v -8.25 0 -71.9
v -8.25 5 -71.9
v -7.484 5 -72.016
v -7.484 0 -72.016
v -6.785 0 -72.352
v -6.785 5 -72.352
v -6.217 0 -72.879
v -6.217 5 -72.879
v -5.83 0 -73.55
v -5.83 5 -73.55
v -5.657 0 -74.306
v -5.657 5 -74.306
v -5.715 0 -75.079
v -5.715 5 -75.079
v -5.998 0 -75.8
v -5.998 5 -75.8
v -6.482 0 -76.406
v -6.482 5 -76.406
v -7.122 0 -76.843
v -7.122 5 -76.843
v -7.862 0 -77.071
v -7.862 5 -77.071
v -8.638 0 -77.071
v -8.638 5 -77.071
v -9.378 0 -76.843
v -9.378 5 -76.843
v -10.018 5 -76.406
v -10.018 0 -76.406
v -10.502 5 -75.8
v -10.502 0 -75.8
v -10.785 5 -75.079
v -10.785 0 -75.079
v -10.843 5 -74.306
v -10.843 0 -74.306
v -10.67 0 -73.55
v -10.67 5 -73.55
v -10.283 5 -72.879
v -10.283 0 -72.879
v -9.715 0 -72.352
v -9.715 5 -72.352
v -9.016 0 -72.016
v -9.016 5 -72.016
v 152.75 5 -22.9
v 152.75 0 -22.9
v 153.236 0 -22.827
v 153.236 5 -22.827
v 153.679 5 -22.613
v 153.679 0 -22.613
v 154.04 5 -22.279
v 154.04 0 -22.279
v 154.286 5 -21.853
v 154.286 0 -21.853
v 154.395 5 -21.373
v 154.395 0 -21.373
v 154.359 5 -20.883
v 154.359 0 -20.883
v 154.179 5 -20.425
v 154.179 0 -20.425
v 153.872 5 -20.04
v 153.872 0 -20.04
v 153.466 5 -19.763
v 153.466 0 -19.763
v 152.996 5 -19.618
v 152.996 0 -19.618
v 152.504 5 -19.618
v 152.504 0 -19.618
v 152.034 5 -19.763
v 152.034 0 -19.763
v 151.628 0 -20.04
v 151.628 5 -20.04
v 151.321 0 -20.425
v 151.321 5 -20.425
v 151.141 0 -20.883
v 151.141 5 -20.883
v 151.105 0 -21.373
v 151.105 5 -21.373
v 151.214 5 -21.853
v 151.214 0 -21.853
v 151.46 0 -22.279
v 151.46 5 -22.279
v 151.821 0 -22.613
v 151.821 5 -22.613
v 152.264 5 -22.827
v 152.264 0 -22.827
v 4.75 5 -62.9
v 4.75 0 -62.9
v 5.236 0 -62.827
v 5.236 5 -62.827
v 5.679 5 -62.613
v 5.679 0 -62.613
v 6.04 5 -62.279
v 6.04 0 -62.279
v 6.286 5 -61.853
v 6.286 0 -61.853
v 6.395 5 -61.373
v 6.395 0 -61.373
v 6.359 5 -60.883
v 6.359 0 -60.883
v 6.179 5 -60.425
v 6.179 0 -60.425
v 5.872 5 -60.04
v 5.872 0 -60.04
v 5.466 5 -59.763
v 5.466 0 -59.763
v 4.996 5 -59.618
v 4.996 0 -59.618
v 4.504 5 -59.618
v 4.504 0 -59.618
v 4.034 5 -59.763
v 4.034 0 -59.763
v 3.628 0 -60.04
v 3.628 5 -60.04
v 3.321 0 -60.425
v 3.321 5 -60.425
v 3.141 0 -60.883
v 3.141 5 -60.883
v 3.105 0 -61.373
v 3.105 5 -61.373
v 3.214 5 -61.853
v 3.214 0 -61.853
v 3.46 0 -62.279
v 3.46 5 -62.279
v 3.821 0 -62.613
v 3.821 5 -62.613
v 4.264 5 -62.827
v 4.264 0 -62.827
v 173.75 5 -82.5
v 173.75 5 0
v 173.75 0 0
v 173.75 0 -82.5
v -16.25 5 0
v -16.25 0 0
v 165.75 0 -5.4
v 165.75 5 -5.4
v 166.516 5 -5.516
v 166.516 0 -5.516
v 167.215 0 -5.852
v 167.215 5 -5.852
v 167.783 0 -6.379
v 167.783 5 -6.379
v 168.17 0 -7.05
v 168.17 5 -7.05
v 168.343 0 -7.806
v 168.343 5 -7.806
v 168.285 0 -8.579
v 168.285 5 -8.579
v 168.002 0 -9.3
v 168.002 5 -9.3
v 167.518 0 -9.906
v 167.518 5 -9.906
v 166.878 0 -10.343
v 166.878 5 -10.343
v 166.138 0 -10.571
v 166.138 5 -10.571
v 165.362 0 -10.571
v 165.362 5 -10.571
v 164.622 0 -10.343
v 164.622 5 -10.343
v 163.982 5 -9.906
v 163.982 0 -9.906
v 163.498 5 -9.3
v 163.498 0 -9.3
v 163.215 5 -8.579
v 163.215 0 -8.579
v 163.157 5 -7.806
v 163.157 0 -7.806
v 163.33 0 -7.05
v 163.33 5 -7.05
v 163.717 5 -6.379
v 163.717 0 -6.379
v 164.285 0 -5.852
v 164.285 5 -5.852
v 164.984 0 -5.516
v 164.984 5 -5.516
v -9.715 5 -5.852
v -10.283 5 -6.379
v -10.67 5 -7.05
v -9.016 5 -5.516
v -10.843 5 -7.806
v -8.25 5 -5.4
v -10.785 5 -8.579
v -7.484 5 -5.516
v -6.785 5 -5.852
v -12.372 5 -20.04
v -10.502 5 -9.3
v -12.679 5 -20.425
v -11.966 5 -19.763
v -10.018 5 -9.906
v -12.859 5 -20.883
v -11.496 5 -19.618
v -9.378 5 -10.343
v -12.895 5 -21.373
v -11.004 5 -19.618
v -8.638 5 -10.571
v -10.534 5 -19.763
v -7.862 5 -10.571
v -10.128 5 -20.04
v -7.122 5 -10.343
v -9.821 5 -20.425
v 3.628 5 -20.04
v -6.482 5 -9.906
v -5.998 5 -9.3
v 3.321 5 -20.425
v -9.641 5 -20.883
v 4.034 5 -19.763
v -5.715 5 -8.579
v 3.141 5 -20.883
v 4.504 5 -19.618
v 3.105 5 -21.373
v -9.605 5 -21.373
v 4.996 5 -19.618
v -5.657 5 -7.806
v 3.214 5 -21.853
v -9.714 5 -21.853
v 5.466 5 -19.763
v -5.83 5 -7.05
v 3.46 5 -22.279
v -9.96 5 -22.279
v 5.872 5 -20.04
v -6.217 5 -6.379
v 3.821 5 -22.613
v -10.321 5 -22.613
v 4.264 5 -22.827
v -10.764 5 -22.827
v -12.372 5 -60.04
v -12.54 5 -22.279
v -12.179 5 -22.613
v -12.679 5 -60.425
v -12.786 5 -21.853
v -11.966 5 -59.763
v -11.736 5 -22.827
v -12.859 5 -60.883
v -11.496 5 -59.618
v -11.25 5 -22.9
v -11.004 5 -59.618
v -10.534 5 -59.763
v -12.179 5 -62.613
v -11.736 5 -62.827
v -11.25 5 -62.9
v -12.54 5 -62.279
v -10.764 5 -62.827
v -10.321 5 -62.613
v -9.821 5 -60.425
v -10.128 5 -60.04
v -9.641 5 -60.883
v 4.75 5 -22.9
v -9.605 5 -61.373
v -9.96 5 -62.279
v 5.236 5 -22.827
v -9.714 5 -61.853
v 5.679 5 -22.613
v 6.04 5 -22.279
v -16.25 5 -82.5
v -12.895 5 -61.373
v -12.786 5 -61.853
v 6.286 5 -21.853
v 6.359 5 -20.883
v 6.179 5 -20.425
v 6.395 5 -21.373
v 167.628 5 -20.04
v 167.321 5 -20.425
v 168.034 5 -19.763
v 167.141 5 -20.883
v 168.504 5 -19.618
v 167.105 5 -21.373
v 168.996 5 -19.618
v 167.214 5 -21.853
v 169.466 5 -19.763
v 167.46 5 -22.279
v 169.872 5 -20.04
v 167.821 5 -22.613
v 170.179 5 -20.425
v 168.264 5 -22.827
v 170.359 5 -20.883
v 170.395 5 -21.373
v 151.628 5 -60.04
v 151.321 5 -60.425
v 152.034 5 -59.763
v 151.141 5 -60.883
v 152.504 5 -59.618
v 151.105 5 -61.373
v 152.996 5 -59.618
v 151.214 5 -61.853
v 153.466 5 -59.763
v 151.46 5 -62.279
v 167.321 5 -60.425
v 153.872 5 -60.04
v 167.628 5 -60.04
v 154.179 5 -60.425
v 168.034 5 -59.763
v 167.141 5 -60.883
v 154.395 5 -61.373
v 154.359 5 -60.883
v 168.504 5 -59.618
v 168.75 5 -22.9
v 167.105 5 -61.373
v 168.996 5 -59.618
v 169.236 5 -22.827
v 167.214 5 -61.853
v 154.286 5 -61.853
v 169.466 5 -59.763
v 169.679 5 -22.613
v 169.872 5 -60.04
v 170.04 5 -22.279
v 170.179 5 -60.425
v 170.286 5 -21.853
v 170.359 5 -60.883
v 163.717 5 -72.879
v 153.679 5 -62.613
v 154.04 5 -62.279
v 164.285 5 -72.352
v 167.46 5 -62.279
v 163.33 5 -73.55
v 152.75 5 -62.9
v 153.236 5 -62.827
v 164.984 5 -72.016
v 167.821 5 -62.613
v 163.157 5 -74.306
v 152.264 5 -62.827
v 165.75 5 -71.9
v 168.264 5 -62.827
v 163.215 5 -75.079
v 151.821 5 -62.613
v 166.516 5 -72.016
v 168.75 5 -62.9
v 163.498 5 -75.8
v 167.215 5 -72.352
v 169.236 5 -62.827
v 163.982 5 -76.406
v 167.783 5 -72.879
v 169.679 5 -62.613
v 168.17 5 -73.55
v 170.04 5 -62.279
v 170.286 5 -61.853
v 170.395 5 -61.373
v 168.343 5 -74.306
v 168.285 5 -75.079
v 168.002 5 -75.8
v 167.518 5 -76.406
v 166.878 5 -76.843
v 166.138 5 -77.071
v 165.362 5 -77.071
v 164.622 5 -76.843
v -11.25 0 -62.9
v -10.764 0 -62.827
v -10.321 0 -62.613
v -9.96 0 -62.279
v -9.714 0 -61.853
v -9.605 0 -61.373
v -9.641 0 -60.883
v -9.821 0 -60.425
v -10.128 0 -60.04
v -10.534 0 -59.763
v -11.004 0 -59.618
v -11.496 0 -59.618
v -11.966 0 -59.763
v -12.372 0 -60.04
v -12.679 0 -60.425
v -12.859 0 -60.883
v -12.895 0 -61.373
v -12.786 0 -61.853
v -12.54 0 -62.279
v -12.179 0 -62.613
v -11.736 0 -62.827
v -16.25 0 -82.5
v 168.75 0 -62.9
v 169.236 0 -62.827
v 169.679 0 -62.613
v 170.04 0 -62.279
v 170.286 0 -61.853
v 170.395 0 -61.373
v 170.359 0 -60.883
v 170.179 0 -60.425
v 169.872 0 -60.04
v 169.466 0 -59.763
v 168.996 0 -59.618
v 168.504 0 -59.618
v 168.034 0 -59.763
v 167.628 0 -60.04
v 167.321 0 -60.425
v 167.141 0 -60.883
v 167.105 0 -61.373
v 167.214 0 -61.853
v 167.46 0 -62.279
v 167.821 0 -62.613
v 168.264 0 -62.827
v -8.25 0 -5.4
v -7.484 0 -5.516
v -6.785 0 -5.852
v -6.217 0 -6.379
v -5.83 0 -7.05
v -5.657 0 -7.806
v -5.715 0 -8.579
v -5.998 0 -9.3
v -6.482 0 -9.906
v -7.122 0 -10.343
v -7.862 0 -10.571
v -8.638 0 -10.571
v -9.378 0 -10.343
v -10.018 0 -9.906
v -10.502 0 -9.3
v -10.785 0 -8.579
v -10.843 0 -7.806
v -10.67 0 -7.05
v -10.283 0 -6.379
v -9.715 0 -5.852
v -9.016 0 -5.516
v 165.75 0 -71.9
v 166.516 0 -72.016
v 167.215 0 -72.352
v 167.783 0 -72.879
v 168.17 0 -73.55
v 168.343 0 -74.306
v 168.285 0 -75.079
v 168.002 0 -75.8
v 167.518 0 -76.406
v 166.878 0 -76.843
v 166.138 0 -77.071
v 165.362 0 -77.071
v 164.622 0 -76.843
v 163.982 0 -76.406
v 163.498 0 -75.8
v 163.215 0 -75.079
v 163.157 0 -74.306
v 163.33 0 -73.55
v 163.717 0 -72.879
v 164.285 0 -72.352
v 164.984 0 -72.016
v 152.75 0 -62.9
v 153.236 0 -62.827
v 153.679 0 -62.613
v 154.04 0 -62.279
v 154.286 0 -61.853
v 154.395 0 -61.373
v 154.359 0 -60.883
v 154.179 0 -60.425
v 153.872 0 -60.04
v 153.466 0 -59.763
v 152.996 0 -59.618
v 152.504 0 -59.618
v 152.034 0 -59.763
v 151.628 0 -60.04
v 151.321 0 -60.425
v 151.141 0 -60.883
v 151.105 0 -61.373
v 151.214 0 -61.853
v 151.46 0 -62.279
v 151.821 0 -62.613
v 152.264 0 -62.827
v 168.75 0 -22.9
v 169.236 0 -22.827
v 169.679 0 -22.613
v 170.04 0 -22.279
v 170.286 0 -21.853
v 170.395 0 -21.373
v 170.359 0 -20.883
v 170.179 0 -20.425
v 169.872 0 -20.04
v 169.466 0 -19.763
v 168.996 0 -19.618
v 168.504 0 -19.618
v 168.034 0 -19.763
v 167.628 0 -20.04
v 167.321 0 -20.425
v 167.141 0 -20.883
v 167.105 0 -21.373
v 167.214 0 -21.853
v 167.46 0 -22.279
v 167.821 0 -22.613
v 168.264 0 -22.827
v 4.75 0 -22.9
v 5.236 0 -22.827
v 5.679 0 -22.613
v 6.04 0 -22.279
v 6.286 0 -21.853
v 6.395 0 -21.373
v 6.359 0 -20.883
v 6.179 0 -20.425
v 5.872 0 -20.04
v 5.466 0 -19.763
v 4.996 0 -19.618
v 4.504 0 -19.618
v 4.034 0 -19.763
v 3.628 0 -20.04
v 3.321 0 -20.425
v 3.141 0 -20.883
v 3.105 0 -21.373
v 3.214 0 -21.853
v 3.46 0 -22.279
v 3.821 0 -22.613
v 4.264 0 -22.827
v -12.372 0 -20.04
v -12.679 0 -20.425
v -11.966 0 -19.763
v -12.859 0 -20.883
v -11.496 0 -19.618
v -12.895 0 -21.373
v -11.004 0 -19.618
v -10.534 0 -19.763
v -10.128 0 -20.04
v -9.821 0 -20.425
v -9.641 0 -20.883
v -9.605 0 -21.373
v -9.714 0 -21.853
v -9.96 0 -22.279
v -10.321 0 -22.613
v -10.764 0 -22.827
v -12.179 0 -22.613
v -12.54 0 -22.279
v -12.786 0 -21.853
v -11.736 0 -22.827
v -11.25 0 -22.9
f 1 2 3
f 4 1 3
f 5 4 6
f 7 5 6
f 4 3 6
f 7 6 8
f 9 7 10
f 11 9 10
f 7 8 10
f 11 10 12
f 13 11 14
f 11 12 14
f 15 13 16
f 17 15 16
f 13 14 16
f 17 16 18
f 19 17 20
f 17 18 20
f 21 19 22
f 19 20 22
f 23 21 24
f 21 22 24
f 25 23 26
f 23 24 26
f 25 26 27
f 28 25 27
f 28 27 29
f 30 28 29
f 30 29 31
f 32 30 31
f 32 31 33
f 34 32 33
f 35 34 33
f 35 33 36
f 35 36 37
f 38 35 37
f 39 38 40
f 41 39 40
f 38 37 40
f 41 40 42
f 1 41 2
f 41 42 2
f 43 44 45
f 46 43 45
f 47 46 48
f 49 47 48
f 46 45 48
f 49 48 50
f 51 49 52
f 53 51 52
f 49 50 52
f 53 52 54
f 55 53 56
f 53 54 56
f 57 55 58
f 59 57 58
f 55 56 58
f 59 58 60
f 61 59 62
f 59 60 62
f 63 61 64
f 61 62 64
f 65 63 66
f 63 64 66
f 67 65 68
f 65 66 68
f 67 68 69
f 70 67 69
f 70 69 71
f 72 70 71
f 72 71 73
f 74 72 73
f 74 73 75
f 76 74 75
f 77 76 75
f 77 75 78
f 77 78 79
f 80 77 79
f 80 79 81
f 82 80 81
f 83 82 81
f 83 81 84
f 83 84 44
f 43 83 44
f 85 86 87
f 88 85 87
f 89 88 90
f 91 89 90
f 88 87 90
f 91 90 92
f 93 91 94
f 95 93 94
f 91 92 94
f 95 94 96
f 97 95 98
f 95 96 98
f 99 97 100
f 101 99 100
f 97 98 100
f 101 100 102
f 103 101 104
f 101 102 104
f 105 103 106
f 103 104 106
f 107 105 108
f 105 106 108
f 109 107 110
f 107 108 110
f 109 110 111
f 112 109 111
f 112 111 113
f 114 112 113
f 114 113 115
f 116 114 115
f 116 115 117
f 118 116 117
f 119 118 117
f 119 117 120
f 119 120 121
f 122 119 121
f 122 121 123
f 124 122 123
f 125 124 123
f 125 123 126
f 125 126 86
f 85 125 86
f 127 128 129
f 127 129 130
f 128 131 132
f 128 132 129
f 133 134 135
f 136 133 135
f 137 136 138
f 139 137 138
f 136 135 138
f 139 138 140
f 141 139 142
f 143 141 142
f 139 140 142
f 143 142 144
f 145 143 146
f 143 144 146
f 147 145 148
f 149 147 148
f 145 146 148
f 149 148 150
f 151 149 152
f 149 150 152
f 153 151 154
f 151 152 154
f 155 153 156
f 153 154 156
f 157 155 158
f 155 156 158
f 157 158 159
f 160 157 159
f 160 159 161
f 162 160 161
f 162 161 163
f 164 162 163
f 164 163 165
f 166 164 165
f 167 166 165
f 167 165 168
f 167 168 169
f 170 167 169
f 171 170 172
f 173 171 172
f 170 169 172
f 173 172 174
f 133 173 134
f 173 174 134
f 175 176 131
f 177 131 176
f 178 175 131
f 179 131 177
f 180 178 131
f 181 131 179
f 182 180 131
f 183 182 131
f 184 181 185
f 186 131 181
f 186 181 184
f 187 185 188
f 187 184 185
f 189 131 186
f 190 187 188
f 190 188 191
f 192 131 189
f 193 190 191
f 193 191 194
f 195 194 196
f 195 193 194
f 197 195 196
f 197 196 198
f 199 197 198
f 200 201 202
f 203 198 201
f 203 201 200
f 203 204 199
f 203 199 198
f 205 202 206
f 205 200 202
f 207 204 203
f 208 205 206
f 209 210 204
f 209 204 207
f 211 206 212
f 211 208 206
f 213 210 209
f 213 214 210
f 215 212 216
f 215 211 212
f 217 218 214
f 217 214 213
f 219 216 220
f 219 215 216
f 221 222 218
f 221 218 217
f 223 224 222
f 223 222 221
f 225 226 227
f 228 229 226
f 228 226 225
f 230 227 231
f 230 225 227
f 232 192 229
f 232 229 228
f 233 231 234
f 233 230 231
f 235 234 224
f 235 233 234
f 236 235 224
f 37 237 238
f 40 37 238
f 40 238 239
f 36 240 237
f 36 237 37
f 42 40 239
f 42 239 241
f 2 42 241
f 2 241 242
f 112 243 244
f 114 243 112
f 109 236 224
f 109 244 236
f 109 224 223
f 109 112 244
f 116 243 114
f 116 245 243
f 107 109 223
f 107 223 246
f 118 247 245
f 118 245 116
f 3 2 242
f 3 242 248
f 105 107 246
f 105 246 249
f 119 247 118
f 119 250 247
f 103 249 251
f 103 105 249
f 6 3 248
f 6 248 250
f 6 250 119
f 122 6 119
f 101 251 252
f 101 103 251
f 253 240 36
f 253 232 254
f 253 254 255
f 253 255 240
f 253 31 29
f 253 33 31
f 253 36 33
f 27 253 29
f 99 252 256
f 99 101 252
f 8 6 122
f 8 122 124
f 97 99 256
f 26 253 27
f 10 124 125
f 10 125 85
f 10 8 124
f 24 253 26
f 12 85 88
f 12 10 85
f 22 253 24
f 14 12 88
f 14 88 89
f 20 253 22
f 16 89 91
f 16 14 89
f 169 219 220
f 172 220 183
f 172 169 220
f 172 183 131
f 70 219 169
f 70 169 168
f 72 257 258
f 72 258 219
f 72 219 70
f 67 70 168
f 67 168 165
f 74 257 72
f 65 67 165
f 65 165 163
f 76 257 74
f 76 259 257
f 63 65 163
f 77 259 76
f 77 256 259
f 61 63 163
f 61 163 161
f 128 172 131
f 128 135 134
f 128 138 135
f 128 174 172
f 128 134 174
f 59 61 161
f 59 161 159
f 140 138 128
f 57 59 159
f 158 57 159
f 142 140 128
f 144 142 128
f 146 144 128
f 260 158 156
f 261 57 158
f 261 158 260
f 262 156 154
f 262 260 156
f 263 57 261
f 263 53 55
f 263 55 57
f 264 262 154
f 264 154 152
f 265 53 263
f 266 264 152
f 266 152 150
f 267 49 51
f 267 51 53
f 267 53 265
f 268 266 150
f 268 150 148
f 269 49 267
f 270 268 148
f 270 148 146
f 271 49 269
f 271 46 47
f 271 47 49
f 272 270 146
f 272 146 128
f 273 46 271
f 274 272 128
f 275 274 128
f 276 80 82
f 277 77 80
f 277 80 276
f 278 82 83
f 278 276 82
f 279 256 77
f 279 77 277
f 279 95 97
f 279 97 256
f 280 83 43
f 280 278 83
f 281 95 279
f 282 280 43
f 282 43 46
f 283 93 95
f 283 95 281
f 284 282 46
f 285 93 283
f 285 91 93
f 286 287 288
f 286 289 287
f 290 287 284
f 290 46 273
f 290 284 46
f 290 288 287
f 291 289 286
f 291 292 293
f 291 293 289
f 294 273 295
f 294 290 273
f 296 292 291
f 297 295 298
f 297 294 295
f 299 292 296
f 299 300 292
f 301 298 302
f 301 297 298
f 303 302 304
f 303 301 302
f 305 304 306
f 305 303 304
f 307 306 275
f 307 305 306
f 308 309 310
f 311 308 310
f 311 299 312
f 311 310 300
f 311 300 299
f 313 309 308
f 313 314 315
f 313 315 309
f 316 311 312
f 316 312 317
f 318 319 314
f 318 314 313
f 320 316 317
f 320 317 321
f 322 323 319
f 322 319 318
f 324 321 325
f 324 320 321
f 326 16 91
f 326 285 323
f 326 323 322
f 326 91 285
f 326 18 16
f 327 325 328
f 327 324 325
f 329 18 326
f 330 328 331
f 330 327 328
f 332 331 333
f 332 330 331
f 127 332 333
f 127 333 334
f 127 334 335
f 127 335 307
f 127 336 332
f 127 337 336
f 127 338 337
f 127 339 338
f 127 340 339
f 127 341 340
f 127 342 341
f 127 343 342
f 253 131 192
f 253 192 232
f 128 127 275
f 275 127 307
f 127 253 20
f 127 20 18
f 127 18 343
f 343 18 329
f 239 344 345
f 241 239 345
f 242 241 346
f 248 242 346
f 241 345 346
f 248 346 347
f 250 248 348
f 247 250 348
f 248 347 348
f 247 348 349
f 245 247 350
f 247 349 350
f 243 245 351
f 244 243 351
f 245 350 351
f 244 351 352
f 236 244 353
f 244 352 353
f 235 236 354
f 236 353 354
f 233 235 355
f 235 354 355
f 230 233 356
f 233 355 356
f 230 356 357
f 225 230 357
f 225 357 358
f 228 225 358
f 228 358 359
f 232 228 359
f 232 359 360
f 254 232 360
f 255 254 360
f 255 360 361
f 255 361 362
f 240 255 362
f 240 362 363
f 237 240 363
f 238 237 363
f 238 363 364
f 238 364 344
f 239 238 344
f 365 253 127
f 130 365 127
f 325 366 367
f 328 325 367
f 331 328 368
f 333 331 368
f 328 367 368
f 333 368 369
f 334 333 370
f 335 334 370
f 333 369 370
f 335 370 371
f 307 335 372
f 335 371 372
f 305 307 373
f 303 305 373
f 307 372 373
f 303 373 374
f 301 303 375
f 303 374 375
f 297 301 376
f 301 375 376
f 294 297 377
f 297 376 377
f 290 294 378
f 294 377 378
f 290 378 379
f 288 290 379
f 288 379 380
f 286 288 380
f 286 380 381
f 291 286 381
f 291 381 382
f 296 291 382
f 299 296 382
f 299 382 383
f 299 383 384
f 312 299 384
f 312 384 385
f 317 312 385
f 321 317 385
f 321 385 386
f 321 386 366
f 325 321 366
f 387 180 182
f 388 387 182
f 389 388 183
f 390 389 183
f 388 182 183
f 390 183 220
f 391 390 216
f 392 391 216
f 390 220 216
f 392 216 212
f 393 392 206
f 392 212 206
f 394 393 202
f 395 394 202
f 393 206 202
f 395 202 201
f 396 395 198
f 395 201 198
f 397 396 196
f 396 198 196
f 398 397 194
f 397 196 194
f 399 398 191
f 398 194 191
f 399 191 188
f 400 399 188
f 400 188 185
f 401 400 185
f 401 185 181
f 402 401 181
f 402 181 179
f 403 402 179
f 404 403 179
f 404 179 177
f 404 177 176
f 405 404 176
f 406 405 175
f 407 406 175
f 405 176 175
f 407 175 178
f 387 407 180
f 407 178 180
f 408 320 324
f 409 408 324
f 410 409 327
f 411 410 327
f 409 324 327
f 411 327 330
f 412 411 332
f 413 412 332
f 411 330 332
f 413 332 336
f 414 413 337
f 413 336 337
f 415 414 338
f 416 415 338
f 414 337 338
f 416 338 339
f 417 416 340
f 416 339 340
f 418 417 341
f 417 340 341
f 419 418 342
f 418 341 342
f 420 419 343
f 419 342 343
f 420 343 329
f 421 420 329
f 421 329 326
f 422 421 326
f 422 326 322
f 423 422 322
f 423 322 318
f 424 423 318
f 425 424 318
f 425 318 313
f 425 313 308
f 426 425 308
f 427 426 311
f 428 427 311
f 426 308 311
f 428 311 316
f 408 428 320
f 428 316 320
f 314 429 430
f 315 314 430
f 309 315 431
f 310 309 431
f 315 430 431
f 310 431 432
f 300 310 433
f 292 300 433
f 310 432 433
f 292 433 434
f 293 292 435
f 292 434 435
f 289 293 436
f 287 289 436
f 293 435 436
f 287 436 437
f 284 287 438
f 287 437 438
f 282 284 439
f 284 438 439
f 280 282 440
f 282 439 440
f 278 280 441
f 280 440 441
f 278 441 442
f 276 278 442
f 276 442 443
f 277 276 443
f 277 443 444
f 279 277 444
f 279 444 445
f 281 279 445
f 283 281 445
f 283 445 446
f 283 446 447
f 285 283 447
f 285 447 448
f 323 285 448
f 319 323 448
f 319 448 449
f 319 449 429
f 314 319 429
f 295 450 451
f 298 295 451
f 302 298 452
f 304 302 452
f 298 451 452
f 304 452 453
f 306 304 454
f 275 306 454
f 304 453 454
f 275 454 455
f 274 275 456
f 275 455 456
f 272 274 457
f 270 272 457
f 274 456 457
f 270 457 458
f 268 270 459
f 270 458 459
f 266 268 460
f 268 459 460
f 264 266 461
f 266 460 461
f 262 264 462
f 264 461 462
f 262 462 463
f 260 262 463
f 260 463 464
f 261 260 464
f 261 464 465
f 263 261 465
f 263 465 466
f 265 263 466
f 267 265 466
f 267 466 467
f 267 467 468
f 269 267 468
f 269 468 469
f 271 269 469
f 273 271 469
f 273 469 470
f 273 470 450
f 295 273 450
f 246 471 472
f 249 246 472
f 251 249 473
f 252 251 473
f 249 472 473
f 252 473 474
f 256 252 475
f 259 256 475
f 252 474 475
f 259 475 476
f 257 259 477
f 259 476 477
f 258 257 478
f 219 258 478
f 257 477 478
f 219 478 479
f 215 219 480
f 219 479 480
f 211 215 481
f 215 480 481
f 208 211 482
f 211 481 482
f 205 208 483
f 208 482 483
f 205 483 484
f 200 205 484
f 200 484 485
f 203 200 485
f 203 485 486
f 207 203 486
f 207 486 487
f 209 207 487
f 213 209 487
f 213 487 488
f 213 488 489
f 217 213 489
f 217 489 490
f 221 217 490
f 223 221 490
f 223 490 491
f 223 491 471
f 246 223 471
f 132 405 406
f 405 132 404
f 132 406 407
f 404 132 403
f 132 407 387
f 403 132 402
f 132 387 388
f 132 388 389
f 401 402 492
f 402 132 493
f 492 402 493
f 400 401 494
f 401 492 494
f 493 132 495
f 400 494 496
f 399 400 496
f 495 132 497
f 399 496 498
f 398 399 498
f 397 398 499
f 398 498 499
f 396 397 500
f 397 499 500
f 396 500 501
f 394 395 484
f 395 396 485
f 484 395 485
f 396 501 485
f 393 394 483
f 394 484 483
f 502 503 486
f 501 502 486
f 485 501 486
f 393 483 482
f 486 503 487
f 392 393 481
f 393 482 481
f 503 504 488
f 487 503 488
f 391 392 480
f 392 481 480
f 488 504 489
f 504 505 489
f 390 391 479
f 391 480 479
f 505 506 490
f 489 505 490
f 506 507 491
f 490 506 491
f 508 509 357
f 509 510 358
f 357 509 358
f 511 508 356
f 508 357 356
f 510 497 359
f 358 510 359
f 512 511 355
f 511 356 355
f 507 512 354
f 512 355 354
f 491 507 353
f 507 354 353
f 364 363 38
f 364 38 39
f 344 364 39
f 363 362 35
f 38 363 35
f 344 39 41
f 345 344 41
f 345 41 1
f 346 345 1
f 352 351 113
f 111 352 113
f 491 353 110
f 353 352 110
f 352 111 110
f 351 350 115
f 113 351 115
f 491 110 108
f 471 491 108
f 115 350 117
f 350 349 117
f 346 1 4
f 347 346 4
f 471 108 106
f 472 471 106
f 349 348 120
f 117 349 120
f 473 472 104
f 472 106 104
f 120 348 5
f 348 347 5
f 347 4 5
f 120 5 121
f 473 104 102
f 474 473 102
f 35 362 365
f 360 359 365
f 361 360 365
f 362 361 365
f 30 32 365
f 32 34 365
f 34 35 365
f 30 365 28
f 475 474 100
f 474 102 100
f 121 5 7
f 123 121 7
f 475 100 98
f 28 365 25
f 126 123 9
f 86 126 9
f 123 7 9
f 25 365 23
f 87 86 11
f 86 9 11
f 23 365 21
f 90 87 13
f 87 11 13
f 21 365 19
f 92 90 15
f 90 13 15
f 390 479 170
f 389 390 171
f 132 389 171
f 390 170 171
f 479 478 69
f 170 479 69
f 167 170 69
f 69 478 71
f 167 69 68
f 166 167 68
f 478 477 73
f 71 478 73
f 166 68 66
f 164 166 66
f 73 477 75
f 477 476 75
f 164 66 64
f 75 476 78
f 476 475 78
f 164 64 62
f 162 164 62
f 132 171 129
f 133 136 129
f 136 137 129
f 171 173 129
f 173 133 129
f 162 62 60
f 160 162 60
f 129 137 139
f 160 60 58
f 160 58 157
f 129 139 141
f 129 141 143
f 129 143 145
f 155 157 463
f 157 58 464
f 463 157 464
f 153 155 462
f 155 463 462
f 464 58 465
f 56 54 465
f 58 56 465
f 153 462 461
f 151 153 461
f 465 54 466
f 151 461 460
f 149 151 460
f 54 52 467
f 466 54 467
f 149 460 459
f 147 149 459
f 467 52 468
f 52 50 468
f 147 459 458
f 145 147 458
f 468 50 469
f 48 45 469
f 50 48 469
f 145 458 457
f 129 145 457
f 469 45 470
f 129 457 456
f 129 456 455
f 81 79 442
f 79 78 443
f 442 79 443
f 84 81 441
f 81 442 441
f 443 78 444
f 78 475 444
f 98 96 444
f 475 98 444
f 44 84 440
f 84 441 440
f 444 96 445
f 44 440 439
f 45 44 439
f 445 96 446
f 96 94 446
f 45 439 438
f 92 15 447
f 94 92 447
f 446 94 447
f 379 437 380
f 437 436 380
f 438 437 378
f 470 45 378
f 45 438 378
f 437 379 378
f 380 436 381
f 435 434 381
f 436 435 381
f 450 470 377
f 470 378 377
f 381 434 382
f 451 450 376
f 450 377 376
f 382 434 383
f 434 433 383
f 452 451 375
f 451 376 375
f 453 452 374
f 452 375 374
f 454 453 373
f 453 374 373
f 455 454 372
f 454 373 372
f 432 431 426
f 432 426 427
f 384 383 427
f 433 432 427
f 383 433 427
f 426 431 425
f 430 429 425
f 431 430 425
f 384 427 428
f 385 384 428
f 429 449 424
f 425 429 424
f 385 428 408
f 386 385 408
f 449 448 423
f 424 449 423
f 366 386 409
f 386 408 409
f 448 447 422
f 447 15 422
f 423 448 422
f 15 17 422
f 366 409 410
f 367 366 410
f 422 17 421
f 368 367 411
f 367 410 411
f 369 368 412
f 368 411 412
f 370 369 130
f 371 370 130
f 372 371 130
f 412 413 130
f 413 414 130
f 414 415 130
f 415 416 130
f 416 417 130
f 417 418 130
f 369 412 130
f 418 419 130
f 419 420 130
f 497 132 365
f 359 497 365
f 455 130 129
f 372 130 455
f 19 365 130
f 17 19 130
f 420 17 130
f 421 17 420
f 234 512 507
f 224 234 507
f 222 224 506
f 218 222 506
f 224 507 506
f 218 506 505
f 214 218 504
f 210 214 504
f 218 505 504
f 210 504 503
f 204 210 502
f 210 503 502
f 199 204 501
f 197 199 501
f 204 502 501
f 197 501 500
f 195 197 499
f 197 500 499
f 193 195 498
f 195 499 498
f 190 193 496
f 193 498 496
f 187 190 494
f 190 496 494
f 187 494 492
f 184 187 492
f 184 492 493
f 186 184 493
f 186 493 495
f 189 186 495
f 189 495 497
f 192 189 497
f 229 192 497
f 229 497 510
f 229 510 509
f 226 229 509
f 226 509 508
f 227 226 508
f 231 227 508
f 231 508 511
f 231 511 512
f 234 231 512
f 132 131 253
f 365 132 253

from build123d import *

# Parameters (mm, degrees)
SKETCH_1_W          = 347.5
SKETCH_1_H          = 165
SKETCH_1_R          = 2.6
EXTRUDE_1_DEPTH     = 5
SKETCH_2_W          = 157.5
SKETCH_2_H          = 82.5
SKETCH_2_H_2        = 55.334629905
SKETCH_2_H_3        = 27.165370095
SKETCH_2_R          = 2.6
SKETCH_2_W_2        = 173.75
SKETCH_2_W_3        = 16.25
CUT_EXTRUDE_2_DEPTH = 5
SKETCH_4_R          = 2.6
CUT_EXTRUDE_3_DEPTH = 5
SKETCH_5_R          = 1.65
CUT_EXTRUDE_4_DEPTH = 10


with BuildPart() as part:
    # 草图1 → 凸台-拉伸1 (new body)
    with BuildSketch(Plane(origin=(0, 5, 0), x_dir=(1, 0, 0), z_dir=(0, 1, 0))):
        Rectangle(SKETCH_1_W, SKETCH_1_H)
        with Locations(Location((-163.75, -70.5, 0), (0, 0, 90))):
            Circle(SKETCH_1_R, mode=Mode.SUBTRACT)
        with Locations(Location((-163.75, -60.5, 0), (0, 0, 90))):
            Circle(SKETCH_1_R, mode=Mode.SUBTRACT)
        with Locations(Location((163.75, -60.5, 0), (0, 0, 90))):
            Circle(SKETCH_1_R, mode=Mode.SUBTRACT)
        with Locations(Location((163.75, -70.5, 0), (0, 0, 90))):
            Circle(SKETCH_1_R, mode=Mode.SUBTRACT)
    extrude(amount=-EXTRUDE_1_DEPTH)

    # 草图2 → 切除-拉伸2 (cut)
    # profile 1 of 7: a face of its own
    with BuildSketch(Plane(origin=(0, 5, 0), x_dir=(1, 0, 0), z_dir=(0, 1, 0))):
        with Locations((-95, 41.25)):
            Rectangle(SKETCH_2_W, SKETCH_2_H)
    # profile 2 of 7: a face of its own
    with BuildSketch(Plane(origin=(0, 5, 0), x_dir=(1, 0, 0), z_dir=(0, 1, 0))):
        with Locations((-95, -27.667314952)):
            Rectangle(SKETCH_2_W, SKETCH_2_H_2)
    # profile 3 of 7: a face of its own
    with BuildSketch(Plane(origin=(0, 5, 0), x_dir=(1, 0, 0), z_dir=(0, 1, 0))):
        with Locations((-95, -68.917314952)):
            Rectangle(SKETCH_2_W, SKETCH_2_H_3)
        with Locations((-163.75, -70.5)):
            Circle(SKETCH_2_R, mode=Mode.SUBTRACT)
        with Locations((-163.75, -60.5)):
            Circle(SKETCH_2_R, mode=Mode.SUBTRACT)
    # profile 4 of 7: a face of its own
    with BuildSketch(Plane(origin=(0, 5, 0), x_dir=(1, 0, 0), z_dir=(0, 1, 0))):
        with Locations((86.875, -68.917314952)):
            Rectangle(SKETCH_2_W_2, SKETCH_2_H_3)
        with Locations((163.75, -70.5)):
            Circle(SKETCH_2_R, mode=Mode.SUBTRACT)
        with Locations((163.75, -60.5)):
            Circle(SKETCH_2_R, mode=Mode.SUBTRACT)
    # profile 5 of 7: a face of its own
    with BuildSketch(Plane(origin=(0, 5, 0), x_dir=(1, 0, 0), z_dir=(0, 1, 0))):
        with Locations((-8.125, -68.917314952)):
            Rectangle(SKETCH_2_W_3, SKETCH_2_H_3)
    # profile 6 of 7: a face of its own
    with BuildSketch(Plane(origin=(0, 5, 0), x_dir=(1, 0, 0), z_dir=(0, 1, 0))):
        with Locations((-8.125, -27.667314952)):
            Rectangle(SKETCH_2_W_3, SKETCH_2_H_2)
    # profile 7 of 7: a face of its own
    with BuildSketch(Plane(origin=(0, 5, 0), x_dir=(1, 0, 0), z_dir=(0, 1, 0))):
        with Locations((86.875, -27.667314952)):
            Rectangle(SKETCH_2_W_2, SKETCH_2_H_2)
    extrude(amount=-CUT_EXTRUDE_2_DEPTH, mode=Mode.SUBTRACT)

    # 草图4 → 切除-拉伸3 (cut)
    with BuildSketch(Plane(origin=(0, 5, 0), x_dir=(1, 0, 0), z_dir=(0, 1, 0))):
        with Locations(Location((165.75, 74.5, 0), (0, 0, 270))):
            Circle(SKETCH_4_R)
        with Locations(Location((165.75, 8, 0), (0, 0, 270))):
            Circle(SKETCH_4_R)
        with Locations(Location((-8.25, 74.5, 0), (0, 0, 270))):
            Circle(SKETCH_4_R)
        with Locations(Location((-8.25, 8, 0), (0, 0, 270))):
            Circle(SKETCH_4_R)
    extrude(amount=-CUT_EXTRUDE_3_DEPTH, mode=Mode.SUBTRACT)

    # 草图5 → 切除-拉伸4 (cut)
    with BuildSketch(Plane.XZ):
        with Locations(Location((-11.25, -61.25, 0), (0, 0, 270))):
            Circle(SKETCH_5_R)
        with Locations(Location((4.75, -61.25, 0), (0, 0, 270))):
            Circle(SKETCH_5_R)
        with Locations(Location((4.75, -21.25, 0), (0, 0, 270))):
            Circle(SKETCH_5_R)
        with Locations(Location((152.75, -61.25, 0), (0, 0, 270))):
            Circle(SKETCH_5_R)
        with Locations(Location((168.75, -61.25, 0), (0, 0, 270))):
            Circle(SKETCH_5_R)
        with Locations(Location((152.75, -21.25, 0), (0, 0, 270))):
            Circle(SKETCH_5_R)
        with Locations(Location((168.75, -21.25, 0), (0, 0, 270))):
            Circle(SKETCH_5_R)
        with Locations(Location((-11.25, -21.25, 0), (0, 0, 270))):
            Circle(SKETCH_5_R)
    extrude(amount=-CUT_EXTRUDE_4_DEPTH, mode=Mode.SUBTRACT)


solid = part.part
